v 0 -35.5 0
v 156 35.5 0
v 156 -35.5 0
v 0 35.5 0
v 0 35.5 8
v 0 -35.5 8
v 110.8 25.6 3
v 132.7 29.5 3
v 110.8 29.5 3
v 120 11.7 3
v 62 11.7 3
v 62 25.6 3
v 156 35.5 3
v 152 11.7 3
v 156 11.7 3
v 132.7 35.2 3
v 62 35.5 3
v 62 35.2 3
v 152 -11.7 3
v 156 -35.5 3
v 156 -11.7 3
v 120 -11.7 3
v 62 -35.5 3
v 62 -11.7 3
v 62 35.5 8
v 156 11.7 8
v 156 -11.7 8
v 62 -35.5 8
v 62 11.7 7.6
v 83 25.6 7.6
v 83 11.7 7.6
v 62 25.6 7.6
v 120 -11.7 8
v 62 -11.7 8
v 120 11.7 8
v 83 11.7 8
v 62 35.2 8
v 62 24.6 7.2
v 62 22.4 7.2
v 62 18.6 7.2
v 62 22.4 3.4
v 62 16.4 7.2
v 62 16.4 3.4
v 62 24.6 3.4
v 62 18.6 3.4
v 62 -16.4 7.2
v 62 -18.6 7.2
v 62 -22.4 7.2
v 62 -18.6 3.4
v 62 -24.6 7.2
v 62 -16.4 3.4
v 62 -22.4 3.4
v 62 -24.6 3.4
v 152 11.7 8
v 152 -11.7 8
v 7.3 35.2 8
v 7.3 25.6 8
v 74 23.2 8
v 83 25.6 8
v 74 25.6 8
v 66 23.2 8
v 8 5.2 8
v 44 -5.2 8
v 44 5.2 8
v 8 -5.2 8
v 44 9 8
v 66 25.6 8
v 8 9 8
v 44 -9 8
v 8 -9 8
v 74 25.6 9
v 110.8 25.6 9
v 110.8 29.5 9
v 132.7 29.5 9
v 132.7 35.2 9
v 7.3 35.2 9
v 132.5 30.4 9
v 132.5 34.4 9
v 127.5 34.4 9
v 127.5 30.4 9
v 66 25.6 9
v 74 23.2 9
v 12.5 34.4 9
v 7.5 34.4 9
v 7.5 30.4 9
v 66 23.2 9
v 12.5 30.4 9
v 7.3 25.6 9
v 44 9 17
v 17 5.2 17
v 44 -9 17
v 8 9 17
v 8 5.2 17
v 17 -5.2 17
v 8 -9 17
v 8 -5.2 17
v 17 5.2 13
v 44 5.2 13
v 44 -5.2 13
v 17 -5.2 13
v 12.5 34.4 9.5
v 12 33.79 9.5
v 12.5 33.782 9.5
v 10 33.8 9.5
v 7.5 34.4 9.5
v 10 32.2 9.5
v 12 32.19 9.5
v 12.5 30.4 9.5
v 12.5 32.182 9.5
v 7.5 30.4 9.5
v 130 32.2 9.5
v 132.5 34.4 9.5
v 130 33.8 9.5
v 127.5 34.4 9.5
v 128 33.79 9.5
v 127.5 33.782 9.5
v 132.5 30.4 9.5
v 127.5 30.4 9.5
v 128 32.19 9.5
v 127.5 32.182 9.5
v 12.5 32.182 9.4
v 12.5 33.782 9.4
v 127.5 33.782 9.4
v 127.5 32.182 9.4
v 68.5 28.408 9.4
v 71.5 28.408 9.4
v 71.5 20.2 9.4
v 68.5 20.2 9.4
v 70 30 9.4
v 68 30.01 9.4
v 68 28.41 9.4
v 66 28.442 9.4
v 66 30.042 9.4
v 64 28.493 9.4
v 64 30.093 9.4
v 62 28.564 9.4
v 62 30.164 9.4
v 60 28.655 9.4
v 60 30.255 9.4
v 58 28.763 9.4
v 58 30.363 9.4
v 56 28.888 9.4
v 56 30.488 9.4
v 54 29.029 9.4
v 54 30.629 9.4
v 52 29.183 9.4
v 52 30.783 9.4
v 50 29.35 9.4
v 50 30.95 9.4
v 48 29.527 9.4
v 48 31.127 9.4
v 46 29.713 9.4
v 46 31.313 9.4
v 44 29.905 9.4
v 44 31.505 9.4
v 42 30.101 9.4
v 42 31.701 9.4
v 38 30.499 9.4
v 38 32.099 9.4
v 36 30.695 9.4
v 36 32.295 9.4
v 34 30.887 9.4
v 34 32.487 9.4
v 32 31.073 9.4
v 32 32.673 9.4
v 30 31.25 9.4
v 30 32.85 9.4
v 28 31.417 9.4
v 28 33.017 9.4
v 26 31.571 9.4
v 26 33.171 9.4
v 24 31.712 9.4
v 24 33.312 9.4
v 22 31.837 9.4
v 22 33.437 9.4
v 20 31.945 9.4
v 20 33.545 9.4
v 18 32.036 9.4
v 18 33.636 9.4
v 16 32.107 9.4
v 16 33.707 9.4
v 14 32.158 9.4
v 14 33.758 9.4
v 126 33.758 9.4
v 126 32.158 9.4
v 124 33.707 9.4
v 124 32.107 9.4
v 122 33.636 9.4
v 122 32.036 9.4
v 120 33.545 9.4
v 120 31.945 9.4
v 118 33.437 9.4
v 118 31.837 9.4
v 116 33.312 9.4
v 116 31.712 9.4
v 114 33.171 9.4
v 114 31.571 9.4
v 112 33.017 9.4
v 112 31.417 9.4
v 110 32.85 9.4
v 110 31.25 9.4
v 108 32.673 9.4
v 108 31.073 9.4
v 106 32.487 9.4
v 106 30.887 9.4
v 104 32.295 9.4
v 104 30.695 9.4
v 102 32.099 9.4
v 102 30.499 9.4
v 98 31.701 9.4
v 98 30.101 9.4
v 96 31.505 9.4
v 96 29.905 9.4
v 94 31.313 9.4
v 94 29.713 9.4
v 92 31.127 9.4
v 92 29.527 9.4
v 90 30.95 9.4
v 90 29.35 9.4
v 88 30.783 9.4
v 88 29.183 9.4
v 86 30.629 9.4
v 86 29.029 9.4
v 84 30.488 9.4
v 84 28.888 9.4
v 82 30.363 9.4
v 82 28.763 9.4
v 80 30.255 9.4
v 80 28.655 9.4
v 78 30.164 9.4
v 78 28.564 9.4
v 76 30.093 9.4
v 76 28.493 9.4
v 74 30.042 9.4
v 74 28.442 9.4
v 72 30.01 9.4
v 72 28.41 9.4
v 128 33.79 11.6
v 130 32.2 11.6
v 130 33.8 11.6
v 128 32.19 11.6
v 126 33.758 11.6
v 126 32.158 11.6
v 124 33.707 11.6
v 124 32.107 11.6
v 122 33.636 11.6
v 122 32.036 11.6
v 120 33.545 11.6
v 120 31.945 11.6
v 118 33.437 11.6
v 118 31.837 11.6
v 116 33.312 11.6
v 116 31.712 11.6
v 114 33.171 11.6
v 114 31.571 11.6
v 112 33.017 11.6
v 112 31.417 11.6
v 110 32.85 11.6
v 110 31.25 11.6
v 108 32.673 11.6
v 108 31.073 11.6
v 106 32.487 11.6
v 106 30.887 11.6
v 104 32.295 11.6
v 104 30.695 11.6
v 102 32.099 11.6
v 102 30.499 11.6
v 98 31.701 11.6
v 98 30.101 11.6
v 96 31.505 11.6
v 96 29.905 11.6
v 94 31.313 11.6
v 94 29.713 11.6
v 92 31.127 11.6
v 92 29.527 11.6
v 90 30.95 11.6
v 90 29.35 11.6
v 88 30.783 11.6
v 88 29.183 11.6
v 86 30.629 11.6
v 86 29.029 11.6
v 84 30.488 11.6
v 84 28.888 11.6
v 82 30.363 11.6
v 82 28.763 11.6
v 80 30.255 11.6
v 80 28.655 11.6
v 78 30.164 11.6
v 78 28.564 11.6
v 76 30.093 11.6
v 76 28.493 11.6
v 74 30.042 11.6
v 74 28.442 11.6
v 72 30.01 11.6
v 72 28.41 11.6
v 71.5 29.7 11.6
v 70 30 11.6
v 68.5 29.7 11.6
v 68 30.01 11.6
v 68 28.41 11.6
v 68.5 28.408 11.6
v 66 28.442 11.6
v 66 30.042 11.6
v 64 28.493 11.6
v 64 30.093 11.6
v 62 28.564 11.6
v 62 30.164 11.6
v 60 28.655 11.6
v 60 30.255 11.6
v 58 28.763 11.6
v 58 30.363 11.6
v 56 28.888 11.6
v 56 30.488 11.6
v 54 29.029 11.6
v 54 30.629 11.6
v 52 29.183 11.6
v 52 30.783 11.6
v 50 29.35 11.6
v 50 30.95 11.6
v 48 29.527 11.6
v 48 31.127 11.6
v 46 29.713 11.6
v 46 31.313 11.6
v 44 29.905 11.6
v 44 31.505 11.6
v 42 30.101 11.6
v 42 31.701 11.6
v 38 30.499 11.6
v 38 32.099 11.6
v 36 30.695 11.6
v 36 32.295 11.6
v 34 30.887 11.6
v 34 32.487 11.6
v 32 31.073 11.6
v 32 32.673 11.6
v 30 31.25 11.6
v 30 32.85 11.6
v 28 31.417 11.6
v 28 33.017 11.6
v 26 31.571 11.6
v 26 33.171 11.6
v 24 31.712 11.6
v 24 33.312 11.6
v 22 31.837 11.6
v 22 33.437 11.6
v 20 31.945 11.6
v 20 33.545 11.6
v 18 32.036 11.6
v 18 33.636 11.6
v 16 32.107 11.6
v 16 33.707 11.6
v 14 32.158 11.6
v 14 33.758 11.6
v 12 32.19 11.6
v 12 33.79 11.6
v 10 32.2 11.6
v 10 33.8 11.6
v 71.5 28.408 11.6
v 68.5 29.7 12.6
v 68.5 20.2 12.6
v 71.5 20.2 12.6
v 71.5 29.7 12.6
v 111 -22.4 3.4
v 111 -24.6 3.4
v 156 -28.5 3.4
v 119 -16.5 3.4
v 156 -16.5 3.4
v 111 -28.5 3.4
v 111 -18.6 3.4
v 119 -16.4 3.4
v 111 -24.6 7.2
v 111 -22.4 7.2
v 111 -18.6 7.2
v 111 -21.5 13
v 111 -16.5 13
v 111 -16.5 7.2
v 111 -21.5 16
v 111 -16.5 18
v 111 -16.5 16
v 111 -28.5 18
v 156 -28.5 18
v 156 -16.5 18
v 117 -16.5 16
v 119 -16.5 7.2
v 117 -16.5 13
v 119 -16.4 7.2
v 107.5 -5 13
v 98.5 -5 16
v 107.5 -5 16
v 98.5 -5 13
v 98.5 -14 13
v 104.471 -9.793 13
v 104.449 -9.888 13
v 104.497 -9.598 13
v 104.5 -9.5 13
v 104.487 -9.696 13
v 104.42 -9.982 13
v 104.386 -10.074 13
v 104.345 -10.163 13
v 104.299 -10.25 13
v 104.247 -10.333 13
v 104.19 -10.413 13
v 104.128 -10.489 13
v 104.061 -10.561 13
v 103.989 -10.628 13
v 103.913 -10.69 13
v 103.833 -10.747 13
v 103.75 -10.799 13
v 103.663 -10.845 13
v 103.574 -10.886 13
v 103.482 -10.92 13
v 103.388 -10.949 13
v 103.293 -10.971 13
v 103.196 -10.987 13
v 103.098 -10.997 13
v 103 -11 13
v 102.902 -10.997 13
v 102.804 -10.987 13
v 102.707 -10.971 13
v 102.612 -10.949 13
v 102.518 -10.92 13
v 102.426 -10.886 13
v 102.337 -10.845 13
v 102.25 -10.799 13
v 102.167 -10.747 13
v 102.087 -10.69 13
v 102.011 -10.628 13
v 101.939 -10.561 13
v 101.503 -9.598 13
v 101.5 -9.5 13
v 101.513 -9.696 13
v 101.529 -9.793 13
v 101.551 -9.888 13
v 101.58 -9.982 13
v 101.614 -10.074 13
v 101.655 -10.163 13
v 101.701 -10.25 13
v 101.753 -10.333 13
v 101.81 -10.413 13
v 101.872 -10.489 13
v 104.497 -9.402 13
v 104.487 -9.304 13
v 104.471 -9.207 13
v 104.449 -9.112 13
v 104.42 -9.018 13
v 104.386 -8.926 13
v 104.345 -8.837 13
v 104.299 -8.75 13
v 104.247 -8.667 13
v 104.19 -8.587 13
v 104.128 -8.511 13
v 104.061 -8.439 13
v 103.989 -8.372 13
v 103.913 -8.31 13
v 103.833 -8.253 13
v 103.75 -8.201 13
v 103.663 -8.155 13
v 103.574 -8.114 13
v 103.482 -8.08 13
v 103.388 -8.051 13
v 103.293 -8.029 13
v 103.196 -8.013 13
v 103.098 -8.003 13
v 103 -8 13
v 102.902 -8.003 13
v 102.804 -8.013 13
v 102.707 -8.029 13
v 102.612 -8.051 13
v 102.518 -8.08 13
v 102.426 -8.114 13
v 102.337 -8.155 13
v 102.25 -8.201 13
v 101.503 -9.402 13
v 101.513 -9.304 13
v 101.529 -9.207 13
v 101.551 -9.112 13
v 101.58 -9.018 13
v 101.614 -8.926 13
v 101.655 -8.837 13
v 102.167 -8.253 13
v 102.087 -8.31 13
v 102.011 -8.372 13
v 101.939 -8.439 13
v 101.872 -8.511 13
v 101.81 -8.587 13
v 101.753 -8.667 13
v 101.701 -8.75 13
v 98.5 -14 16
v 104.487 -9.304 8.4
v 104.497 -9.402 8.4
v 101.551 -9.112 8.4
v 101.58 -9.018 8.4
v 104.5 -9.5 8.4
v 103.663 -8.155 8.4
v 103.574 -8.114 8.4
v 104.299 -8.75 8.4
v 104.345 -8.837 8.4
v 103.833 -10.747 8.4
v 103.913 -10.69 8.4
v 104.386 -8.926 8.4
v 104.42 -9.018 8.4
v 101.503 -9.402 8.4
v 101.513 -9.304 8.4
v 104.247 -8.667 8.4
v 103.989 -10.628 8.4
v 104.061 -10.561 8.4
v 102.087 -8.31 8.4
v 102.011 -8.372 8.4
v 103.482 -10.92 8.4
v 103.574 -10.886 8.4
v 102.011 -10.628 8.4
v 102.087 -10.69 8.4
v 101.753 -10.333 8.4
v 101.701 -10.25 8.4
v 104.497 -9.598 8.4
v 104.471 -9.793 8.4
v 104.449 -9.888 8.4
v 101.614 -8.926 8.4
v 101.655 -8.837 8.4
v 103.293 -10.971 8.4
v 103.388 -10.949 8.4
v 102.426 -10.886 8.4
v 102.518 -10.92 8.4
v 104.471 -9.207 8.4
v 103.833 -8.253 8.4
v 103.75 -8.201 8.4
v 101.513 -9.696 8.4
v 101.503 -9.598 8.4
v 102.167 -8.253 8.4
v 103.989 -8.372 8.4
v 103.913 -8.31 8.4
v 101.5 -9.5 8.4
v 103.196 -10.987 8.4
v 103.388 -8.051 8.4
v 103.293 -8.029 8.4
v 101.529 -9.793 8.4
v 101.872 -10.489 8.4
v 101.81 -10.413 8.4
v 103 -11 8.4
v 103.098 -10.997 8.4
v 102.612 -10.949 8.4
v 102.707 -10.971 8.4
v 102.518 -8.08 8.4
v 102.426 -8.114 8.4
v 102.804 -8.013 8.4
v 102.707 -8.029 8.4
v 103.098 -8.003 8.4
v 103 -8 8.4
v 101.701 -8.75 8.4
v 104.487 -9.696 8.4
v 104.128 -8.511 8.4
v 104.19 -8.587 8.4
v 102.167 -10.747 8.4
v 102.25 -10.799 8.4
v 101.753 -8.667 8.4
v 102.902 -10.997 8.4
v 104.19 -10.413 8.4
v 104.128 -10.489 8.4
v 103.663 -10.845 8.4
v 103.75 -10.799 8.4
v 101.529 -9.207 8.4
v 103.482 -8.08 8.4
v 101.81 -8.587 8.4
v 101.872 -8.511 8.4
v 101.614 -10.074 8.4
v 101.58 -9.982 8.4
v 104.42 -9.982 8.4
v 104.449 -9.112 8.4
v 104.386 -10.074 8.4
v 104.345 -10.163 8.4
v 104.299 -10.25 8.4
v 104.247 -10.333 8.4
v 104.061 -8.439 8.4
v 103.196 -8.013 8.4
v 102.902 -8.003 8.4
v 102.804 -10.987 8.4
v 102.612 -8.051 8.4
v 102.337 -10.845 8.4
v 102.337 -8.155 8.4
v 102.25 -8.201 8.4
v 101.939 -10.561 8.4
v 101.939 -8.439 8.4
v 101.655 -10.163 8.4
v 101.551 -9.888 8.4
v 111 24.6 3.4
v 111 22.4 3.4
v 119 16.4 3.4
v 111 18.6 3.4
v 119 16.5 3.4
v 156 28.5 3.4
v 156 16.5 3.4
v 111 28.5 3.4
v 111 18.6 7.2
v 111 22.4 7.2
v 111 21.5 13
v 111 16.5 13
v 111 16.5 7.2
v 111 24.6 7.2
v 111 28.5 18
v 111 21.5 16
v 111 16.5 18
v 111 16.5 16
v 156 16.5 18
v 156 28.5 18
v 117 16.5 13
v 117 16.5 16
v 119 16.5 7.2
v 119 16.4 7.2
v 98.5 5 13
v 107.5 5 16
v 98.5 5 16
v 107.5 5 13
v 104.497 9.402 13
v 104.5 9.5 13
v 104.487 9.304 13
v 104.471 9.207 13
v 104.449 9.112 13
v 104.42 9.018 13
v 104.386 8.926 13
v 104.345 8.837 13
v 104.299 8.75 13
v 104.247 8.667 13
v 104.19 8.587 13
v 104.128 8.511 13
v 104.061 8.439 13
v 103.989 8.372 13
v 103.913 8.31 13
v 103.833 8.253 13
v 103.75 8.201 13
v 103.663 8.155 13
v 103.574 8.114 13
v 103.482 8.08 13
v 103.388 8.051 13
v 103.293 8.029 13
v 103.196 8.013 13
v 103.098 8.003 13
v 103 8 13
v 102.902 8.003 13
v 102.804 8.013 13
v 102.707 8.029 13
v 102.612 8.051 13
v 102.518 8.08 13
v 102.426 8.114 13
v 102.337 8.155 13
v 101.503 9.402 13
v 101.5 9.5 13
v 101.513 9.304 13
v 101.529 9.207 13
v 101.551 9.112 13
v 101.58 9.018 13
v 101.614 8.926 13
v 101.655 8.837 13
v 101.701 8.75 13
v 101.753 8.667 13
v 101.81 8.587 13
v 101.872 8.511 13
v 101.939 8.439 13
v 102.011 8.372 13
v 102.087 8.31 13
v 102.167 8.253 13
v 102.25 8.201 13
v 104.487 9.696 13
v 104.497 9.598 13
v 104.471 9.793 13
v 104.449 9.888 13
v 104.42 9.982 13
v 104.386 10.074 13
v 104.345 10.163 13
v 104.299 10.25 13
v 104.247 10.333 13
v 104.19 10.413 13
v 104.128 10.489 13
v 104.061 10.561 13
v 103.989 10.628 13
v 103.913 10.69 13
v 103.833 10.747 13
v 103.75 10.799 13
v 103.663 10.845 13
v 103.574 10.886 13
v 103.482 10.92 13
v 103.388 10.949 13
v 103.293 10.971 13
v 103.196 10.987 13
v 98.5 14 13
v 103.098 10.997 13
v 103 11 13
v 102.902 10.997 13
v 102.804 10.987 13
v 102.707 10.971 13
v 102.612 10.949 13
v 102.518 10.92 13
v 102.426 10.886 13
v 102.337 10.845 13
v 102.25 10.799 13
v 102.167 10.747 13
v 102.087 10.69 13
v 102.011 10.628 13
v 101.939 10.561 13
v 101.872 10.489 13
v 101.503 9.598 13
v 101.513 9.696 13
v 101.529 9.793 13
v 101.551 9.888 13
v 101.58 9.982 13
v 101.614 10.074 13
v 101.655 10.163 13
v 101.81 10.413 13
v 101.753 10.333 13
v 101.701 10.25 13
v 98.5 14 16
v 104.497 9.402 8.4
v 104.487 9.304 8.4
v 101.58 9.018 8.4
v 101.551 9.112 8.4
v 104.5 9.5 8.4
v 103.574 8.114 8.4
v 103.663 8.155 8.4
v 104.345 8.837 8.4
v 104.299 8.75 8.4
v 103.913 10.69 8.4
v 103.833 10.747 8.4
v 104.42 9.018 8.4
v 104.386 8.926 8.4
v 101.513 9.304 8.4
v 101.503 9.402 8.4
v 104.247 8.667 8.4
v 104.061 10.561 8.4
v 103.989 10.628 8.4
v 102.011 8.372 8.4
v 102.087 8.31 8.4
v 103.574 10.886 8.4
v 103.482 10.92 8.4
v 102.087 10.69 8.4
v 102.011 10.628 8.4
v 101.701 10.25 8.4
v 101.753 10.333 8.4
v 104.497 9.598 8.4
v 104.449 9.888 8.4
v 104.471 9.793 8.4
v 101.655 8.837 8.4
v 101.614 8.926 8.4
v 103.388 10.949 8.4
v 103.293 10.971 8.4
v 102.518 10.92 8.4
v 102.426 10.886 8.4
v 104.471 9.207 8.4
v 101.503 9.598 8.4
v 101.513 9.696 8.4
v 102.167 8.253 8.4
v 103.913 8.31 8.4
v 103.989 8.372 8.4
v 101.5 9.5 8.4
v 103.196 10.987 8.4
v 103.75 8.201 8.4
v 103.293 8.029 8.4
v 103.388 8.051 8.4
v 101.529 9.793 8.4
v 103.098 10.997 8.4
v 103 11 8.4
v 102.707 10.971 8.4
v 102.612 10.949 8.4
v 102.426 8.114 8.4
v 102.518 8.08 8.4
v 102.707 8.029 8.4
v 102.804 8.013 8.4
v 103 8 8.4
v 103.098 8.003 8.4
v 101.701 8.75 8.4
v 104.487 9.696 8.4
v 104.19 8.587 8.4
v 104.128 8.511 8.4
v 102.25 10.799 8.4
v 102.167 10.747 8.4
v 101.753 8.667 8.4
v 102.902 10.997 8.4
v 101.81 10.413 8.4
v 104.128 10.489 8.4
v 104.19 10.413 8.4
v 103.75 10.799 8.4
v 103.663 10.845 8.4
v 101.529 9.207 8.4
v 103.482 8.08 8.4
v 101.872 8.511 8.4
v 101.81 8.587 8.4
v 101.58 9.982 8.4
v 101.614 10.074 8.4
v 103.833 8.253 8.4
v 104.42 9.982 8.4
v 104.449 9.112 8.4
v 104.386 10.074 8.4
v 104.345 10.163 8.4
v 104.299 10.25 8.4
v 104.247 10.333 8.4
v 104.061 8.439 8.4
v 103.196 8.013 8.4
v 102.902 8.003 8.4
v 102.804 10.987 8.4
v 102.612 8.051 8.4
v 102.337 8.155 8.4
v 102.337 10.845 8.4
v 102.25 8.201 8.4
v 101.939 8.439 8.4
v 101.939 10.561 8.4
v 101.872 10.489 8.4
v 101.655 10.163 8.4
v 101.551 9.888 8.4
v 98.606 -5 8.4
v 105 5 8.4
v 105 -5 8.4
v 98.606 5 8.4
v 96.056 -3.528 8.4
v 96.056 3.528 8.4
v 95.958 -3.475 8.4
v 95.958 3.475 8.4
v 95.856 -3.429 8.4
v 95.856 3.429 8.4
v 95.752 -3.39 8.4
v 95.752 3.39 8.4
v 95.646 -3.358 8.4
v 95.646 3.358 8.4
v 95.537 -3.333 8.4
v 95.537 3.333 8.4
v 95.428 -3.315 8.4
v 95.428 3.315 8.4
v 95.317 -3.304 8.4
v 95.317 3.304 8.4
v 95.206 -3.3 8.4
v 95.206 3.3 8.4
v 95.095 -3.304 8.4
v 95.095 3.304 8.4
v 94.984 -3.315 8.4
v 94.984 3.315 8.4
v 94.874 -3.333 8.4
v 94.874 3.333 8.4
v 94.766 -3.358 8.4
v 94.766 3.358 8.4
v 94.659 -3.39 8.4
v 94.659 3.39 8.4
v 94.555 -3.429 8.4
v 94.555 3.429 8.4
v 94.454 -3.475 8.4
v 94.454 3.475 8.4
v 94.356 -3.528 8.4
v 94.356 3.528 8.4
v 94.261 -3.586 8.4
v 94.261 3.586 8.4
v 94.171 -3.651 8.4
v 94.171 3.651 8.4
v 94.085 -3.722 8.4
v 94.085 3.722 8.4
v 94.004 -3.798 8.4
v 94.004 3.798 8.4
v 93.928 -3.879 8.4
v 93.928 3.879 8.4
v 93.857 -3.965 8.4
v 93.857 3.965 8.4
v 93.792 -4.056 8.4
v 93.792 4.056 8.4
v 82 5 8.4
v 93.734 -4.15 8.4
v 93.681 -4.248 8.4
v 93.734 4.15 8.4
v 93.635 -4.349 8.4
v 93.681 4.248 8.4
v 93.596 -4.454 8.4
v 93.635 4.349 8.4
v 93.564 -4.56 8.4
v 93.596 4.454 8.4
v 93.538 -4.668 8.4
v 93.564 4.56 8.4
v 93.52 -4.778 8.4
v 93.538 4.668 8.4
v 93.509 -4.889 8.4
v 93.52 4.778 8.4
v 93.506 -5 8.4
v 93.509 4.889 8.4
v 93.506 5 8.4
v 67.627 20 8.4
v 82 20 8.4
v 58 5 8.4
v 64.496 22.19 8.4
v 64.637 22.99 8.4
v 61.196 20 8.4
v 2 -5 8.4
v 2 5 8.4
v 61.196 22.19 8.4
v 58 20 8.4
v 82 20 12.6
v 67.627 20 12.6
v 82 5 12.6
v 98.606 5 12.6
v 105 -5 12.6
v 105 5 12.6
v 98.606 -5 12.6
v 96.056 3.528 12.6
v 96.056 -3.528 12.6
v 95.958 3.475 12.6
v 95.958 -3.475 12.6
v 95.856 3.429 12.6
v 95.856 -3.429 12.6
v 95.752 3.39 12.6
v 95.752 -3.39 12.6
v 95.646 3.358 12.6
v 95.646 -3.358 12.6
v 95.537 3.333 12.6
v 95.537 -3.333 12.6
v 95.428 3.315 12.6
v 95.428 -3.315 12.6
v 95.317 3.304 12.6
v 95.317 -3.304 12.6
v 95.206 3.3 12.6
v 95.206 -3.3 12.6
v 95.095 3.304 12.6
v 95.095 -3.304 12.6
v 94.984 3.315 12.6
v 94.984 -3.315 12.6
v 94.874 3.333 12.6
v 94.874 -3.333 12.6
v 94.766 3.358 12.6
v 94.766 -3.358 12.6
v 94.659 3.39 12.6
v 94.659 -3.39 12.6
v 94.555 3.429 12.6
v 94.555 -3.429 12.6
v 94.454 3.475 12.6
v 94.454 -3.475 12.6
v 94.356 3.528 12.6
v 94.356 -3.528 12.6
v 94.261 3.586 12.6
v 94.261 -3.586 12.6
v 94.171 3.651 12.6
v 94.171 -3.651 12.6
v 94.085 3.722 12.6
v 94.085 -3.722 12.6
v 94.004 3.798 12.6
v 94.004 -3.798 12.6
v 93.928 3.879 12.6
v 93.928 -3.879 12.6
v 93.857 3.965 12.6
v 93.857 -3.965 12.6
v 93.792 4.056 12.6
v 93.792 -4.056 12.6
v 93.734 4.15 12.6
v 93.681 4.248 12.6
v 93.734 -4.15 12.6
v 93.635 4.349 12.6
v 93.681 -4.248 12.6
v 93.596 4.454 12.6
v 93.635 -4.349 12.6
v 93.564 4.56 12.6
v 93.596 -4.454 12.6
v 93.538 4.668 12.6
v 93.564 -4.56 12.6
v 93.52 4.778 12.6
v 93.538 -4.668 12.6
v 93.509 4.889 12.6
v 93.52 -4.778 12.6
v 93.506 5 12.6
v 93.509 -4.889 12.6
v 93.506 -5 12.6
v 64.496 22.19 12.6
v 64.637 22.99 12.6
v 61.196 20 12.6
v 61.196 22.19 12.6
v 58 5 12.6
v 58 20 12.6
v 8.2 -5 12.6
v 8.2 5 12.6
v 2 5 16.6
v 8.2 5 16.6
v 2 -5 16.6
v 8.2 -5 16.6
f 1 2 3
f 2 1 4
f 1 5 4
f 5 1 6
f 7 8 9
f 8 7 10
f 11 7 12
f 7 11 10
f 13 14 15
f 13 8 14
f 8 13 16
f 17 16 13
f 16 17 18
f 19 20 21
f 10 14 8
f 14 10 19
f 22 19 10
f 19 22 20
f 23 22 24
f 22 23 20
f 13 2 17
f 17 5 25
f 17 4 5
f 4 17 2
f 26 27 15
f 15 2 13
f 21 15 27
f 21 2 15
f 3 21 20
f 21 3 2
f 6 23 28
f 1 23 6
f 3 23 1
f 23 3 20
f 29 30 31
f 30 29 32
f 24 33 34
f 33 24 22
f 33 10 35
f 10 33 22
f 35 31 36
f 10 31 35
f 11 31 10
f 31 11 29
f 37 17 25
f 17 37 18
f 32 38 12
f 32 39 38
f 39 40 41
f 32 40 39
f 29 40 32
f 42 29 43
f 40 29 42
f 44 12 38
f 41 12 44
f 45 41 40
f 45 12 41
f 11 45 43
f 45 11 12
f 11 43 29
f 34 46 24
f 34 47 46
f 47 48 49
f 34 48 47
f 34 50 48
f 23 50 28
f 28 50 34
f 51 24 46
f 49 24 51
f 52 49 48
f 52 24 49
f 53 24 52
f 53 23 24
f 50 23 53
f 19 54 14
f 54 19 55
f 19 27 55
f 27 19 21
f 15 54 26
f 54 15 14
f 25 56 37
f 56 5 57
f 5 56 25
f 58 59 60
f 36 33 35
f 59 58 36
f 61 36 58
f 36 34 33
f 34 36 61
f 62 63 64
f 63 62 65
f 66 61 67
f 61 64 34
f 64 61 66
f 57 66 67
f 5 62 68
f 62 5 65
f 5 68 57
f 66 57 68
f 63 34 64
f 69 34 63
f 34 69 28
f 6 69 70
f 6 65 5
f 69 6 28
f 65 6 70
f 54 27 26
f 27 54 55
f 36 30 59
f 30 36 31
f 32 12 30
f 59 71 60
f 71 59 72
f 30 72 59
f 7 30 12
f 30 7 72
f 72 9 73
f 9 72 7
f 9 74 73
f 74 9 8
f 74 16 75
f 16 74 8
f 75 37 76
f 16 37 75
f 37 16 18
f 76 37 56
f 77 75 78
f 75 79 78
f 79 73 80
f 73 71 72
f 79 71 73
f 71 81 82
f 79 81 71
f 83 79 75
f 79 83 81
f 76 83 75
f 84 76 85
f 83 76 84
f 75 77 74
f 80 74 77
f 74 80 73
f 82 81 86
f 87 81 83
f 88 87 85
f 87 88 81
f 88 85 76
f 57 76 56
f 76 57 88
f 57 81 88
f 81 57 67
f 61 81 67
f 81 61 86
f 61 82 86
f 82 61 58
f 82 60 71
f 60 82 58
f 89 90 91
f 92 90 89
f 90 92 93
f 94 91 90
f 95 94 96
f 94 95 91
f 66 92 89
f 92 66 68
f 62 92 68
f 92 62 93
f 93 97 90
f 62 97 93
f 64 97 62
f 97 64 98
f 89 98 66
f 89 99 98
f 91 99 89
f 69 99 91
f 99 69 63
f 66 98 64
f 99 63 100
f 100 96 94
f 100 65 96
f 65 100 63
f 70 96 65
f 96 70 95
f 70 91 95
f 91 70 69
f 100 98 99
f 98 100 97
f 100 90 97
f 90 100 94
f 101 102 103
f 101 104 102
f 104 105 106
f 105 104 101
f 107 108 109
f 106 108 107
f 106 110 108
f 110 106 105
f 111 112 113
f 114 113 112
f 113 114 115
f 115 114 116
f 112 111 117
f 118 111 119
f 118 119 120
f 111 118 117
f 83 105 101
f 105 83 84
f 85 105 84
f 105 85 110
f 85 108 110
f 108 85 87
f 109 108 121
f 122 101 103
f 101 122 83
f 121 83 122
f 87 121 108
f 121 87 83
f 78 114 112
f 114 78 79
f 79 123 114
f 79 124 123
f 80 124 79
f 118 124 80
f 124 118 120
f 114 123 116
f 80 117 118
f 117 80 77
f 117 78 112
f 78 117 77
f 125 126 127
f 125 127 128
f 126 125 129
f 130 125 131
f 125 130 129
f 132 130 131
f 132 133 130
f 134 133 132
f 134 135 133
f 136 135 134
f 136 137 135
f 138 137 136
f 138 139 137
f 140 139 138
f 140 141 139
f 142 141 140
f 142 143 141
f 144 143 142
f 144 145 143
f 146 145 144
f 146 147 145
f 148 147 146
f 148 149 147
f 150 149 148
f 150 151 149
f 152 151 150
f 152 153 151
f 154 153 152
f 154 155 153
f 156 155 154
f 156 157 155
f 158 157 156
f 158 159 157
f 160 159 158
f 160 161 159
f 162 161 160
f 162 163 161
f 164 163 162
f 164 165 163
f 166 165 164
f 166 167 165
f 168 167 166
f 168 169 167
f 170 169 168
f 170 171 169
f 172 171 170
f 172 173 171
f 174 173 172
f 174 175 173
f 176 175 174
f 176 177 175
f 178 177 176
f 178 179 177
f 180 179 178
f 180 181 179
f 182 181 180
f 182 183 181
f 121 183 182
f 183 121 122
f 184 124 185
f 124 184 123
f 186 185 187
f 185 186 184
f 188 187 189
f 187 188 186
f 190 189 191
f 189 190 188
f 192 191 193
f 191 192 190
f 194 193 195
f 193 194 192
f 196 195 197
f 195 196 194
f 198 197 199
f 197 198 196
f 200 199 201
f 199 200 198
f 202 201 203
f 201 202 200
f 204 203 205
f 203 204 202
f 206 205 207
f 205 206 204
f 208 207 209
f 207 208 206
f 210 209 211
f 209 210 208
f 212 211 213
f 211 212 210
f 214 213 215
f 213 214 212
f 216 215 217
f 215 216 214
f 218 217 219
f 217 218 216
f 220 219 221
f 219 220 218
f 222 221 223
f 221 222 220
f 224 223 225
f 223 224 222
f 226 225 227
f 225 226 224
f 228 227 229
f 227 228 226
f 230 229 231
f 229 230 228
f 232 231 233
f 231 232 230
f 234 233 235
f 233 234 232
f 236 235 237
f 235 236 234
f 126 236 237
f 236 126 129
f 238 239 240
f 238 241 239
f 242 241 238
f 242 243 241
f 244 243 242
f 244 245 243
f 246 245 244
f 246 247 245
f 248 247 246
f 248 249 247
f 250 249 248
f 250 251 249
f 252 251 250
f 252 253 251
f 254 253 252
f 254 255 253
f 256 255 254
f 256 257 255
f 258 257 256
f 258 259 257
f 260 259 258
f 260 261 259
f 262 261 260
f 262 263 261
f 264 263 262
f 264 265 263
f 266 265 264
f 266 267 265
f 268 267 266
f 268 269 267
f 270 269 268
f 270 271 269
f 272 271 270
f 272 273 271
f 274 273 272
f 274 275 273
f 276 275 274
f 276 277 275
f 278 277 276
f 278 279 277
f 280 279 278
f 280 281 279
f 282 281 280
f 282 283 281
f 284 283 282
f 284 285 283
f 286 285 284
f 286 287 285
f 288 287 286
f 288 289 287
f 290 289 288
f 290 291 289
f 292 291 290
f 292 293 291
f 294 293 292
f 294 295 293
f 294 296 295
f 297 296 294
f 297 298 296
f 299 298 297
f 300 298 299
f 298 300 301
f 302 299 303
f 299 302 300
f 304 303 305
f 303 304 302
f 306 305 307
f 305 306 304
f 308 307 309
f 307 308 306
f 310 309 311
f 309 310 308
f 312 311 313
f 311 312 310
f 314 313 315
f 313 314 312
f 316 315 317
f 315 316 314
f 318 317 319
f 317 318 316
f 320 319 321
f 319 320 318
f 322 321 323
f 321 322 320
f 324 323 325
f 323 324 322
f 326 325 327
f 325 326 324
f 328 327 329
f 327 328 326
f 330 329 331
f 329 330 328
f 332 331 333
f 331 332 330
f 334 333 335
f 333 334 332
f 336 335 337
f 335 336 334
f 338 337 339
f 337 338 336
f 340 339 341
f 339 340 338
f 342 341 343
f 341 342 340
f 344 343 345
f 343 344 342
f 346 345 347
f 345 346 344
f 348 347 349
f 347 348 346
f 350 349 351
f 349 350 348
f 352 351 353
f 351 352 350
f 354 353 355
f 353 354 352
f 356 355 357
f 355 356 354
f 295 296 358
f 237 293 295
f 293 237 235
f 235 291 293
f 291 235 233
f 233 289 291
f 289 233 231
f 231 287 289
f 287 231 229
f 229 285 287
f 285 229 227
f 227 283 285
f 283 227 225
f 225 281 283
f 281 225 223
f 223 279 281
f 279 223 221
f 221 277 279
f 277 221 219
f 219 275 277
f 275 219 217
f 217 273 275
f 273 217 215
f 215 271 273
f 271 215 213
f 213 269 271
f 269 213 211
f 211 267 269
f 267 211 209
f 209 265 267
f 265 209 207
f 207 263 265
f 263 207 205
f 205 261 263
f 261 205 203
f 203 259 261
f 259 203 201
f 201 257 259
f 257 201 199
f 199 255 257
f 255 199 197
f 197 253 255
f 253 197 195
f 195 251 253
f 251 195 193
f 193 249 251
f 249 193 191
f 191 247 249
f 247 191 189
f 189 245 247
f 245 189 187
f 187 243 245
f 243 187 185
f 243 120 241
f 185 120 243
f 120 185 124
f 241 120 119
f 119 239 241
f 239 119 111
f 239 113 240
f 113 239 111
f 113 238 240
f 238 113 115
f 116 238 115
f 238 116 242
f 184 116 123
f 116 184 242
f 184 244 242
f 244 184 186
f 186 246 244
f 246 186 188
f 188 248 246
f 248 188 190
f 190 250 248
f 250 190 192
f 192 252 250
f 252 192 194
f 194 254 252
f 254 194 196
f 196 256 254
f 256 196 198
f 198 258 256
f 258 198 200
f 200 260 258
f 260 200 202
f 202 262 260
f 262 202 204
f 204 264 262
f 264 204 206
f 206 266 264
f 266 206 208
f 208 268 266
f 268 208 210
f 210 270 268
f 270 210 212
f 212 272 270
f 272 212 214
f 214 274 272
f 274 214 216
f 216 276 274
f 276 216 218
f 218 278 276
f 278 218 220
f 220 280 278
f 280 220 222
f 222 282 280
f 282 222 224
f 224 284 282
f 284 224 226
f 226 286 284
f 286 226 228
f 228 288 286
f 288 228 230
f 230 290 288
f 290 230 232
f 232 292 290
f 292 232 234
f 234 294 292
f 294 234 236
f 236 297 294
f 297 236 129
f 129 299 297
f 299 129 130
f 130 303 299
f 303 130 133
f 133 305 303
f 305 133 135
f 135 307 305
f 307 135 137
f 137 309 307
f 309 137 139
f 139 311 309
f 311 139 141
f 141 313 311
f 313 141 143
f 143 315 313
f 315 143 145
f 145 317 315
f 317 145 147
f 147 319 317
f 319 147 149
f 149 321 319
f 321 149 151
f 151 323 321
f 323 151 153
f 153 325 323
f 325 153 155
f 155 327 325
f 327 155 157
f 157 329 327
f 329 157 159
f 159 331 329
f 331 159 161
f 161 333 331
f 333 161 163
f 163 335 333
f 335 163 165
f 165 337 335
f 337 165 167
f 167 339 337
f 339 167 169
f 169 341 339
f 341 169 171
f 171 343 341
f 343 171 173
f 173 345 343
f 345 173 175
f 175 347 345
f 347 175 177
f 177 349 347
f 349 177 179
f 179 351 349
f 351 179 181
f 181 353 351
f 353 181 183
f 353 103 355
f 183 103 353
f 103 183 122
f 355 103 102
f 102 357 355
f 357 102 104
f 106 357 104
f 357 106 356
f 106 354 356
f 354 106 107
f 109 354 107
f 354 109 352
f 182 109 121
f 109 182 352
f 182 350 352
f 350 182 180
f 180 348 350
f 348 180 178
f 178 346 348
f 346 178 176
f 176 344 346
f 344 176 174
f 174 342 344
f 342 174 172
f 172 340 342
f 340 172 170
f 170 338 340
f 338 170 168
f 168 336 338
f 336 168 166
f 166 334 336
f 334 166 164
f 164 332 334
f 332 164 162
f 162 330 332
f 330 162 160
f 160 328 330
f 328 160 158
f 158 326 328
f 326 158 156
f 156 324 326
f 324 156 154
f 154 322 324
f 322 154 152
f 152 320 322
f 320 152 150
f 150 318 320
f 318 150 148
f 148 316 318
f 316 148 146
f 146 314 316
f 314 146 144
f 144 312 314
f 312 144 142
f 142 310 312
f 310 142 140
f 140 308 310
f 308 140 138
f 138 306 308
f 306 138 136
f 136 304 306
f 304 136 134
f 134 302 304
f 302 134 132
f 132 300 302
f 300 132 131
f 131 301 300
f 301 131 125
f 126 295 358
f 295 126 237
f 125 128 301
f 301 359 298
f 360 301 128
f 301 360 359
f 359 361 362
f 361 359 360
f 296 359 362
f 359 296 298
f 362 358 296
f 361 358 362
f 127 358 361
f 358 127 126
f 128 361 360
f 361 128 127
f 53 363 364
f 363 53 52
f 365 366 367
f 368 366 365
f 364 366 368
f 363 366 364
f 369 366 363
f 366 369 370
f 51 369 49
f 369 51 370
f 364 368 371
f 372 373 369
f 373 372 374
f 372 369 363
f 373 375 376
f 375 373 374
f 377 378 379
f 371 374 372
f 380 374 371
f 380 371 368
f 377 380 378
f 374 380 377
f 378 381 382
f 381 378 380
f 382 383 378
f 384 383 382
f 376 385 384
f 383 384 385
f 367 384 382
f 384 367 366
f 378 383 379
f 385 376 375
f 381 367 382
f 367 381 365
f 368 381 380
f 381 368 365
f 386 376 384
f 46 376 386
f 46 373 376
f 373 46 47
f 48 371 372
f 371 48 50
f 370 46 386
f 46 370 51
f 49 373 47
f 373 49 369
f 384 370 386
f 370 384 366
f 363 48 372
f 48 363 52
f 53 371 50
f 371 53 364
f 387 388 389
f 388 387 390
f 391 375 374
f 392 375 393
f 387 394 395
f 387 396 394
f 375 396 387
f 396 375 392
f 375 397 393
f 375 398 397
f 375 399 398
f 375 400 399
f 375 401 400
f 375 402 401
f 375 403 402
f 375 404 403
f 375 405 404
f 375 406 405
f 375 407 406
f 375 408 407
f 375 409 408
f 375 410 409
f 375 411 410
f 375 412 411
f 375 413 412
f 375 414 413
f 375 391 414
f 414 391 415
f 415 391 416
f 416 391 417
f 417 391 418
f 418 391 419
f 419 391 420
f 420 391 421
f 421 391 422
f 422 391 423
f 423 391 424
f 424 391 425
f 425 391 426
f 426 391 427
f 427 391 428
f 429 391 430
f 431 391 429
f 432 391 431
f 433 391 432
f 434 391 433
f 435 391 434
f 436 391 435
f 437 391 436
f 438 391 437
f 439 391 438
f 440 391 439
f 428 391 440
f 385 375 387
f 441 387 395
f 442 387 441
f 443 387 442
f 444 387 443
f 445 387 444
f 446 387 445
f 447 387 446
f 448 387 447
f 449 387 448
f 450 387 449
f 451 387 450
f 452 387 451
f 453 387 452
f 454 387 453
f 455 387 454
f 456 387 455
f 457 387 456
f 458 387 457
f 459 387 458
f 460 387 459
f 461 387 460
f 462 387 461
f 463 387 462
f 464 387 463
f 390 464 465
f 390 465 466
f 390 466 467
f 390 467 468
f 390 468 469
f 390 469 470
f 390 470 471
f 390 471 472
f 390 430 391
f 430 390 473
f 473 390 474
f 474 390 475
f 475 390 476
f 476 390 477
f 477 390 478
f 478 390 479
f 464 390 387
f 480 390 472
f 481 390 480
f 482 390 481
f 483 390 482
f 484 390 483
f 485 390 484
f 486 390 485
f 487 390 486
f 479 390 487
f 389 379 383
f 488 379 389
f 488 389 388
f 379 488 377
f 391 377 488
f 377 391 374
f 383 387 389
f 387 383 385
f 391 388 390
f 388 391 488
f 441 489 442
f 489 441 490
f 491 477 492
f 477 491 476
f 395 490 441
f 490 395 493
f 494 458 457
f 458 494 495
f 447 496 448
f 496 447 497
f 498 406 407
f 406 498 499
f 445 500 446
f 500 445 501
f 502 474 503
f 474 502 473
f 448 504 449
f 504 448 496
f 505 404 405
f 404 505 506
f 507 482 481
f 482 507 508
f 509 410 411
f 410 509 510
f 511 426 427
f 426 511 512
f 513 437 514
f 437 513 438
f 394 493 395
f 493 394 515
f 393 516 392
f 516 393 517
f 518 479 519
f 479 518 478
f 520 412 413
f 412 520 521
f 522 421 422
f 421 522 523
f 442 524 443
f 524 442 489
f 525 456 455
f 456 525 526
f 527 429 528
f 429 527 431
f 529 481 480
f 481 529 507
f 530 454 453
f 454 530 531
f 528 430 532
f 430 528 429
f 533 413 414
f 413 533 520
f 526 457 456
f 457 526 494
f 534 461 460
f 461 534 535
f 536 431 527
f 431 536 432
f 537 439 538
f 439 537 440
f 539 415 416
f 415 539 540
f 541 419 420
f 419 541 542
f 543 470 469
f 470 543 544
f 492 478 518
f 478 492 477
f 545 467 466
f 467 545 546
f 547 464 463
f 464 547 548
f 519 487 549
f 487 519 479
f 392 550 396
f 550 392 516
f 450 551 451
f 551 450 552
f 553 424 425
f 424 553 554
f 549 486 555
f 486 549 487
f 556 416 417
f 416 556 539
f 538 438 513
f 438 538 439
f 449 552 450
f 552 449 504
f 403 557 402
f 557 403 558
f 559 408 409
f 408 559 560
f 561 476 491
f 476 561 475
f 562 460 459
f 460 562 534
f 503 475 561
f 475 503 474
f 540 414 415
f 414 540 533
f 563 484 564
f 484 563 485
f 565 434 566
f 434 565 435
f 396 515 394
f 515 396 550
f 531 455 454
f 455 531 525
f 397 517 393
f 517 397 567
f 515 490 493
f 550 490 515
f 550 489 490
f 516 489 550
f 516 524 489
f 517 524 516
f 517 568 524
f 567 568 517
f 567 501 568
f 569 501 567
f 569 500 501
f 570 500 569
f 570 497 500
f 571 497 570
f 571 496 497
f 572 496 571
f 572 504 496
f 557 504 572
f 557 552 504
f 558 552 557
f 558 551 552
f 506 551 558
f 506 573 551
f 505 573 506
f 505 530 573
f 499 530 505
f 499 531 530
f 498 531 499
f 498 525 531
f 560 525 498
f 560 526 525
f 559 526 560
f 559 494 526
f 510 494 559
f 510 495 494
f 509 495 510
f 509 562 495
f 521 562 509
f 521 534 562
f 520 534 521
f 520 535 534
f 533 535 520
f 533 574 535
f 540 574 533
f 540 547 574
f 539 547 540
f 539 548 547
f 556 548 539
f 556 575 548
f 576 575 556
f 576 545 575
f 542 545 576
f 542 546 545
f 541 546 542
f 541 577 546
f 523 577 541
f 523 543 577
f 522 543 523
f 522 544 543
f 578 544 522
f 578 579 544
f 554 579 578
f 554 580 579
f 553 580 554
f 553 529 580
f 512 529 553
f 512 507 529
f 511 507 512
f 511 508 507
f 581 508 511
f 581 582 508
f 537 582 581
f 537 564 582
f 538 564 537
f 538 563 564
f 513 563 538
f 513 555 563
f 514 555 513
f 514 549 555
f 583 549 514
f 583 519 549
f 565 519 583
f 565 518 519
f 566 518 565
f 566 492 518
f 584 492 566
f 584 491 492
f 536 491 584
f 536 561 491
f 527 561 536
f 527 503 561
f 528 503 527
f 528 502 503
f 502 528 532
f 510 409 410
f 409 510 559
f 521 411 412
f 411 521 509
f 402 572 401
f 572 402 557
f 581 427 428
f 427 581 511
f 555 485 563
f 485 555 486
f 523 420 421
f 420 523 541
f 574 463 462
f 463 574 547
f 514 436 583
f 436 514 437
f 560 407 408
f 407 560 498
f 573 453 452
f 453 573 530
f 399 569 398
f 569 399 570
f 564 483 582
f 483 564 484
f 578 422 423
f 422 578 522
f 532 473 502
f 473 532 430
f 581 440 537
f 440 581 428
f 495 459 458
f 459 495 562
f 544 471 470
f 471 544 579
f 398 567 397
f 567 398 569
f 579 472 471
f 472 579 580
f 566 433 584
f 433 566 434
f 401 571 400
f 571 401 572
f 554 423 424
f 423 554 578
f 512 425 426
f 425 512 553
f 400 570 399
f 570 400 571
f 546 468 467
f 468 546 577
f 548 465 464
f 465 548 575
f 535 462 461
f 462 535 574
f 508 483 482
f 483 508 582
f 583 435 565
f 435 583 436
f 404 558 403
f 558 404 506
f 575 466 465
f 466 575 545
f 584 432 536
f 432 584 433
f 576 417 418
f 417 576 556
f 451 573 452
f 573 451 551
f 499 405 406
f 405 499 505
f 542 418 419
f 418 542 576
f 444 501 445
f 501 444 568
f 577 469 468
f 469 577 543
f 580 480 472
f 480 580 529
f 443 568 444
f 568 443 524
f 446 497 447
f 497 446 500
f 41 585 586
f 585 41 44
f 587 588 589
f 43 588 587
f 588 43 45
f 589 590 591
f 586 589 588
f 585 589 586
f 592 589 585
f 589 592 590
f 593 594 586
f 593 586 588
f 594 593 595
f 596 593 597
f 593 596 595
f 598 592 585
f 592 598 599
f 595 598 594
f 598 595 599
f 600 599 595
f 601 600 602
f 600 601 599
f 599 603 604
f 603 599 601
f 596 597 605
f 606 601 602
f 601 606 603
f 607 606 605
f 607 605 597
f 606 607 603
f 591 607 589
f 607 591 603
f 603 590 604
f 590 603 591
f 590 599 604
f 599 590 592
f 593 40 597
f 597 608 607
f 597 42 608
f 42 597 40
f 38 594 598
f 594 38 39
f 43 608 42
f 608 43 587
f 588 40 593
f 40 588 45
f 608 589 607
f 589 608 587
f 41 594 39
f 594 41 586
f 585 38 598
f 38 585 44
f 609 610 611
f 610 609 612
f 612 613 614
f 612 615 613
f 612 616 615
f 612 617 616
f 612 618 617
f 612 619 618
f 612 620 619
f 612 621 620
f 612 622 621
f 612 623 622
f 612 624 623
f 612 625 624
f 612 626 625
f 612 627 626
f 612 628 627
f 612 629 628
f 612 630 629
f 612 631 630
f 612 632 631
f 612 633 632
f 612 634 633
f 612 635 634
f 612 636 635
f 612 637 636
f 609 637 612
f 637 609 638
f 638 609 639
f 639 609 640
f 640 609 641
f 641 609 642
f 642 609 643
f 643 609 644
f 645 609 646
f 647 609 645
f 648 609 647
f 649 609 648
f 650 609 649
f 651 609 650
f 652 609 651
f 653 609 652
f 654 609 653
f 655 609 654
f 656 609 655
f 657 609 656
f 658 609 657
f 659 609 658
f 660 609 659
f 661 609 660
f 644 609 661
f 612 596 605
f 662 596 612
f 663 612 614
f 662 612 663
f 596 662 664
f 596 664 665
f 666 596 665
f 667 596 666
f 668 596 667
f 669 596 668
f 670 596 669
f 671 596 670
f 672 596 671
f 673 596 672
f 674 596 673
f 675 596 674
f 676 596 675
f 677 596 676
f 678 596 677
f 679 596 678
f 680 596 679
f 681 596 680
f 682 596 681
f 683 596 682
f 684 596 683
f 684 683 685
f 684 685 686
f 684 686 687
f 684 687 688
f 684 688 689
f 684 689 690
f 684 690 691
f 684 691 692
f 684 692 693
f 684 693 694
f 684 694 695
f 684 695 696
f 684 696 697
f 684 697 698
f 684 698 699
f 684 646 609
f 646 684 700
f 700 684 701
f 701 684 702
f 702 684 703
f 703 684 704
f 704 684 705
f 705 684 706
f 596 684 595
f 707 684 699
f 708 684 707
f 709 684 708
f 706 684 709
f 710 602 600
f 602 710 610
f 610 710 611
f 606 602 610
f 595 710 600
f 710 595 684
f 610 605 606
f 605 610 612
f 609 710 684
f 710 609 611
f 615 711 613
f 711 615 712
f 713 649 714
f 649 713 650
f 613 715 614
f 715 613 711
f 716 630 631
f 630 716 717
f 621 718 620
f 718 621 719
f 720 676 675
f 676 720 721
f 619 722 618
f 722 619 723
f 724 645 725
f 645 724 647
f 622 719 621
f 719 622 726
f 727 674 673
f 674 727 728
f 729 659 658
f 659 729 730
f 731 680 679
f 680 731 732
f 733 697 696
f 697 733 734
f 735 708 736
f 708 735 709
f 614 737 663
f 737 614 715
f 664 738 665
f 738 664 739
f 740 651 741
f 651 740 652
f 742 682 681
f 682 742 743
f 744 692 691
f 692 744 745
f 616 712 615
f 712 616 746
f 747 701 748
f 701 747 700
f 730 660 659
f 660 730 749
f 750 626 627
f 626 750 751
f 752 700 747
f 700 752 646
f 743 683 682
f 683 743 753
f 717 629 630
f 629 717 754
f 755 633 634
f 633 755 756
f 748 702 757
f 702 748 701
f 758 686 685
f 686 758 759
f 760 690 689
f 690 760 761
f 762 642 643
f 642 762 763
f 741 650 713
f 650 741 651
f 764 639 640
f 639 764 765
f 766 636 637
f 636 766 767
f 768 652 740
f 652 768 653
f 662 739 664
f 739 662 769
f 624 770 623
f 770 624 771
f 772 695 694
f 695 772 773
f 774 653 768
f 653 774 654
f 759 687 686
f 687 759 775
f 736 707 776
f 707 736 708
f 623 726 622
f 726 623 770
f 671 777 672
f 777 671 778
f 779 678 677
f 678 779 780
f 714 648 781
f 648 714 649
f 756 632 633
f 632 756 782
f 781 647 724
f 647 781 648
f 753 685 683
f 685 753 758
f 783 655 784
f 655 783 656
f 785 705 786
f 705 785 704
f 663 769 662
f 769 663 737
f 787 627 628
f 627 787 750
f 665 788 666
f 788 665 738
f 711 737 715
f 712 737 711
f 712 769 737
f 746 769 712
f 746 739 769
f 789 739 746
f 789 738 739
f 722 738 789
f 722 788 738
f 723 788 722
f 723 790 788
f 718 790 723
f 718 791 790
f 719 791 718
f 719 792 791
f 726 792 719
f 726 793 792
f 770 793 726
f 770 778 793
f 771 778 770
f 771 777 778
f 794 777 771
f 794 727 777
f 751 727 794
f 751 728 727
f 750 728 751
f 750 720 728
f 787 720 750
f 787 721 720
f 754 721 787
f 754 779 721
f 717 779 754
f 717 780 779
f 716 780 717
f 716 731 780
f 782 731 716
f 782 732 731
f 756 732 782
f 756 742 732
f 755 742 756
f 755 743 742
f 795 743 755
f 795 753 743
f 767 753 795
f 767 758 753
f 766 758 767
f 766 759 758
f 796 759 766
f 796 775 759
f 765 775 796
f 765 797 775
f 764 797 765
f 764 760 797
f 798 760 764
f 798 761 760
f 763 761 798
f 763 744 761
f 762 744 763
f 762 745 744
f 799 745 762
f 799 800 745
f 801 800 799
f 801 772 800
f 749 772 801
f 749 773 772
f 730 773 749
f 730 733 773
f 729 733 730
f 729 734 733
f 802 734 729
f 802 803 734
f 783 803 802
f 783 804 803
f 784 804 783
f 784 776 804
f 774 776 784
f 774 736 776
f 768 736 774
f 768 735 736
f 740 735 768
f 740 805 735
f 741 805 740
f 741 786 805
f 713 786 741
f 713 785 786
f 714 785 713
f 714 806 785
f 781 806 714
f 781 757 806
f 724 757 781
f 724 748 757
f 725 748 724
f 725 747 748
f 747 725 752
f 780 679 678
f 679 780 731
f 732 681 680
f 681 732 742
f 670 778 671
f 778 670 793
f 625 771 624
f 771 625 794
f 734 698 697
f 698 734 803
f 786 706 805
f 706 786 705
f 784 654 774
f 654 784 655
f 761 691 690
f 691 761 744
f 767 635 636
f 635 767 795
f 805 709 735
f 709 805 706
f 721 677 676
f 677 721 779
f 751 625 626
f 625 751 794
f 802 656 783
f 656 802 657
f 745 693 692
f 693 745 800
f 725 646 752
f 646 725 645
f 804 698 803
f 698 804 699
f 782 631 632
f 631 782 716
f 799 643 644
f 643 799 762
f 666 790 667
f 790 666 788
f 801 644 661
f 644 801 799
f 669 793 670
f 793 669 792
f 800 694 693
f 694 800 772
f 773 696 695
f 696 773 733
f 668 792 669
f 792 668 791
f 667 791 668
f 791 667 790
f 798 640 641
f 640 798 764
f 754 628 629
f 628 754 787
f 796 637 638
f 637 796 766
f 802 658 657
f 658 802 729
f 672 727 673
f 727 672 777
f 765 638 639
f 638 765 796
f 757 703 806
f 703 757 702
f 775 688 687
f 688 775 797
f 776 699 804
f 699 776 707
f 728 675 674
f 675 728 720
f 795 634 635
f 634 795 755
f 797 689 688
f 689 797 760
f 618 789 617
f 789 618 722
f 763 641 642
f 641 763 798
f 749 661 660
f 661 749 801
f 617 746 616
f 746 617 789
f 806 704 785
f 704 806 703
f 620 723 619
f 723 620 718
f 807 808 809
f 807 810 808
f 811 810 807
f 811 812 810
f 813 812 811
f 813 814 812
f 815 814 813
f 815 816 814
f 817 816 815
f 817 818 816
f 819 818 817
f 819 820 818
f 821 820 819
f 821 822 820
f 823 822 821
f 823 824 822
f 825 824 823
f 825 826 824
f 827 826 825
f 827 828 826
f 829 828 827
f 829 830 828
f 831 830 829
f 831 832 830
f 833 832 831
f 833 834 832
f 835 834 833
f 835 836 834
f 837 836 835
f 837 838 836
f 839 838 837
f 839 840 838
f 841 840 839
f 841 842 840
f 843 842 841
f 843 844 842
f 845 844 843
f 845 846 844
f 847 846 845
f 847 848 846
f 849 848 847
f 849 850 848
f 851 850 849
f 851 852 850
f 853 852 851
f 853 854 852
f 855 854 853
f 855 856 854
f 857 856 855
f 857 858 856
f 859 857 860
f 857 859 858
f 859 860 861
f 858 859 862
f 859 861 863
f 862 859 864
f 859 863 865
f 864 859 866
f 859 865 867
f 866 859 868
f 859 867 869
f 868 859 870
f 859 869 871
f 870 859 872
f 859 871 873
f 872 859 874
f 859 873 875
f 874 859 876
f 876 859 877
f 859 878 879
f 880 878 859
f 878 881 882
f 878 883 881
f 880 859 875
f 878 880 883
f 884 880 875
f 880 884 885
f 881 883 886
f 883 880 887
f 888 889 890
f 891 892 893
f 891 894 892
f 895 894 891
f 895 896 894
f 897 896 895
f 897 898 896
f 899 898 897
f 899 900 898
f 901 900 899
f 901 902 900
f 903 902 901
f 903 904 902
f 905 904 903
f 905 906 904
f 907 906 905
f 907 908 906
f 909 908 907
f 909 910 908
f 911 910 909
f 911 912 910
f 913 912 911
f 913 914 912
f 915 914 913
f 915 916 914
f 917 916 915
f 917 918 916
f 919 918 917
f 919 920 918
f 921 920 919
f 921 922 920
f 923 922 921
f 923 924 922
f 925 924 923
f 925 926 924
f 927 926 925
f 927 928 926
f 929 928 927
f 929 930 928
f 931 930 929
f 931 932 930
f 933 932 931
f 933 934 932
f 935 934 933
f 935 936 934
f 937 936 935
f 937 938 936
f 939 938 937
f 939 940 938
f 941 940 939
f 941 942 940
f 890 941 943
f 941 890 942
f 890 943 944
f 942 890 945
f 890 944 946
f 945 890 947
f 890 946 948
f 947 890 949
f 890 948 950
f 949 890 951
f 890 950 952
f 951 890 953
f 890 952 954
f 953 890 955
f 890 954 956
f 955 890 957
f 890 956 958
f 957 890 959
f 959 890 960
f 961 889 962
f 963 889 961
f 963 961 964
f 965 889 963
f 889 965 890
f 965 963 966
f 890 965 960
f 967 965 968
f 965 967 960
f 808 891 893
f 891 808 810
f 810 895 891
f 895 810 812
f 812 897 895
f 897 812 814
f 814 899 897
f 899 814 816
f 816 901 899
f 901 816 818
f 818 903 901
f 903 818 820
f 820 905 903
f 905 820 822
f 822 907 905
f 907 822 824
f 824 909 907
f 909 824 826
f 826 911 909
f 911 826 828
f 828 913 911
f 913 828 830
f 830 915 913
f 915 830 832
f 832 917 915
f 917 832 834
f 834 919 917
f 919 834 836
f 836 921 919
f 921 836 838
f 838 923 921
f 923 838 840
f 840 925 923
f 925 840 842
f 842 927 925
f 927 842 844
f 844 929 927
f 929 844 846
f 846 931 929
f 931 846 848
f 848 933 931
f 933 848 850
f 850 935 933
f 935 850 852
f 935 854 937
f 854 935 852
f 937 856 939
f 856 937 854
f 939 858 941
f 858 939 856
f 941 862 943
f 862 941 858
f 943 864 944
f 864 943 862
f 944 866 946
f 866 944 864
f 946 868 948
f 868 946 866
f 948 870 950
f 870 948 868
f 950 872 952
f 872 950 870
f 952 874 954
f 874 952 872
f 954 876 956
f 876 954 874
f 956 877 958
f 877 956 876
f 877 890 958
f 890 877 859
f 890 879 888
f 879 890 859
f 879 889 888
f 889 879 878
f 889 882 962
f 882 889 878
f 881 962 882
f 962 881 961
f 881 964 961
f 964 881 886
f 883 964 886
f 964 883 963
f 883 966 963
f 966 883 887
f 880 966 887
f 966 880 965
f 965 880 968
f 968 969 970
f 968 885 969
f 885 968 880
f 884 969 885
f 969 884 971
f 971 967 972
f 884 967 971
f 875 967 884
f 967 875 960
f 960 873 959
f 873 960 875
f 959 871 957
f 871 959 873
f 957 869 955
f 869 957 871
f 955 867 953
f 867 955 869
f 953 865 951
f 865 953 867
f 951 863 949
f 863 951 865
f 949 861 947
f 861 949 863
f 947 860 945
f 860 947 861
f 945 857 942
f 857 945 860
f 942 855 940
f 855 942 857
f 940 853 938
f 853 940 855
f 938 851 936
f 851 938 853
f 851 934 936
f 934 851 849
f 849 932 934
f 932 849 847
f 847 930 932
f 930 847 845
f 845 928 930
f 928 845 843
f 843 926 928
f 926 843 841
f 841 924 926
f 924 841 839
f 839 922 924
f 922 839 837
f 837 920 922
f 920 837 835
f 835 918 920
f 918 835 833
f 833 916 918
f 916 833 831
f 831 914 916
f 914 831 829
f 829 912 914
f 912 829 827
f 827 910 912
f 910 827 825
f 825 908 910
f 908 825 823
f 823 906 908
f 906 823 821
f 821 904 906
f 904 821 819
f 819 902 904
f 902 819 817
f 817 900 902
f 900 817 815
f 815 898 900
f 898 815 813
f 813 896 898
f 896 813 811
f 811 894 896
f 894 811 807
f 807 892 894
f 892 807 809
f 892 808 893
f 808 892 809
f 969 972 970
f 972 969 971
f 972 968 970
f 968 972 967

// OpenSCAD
// Print this first. A short version of the production collet grabber — nothing
// copied, just the entry design with shorter fingers — to tune the collar
// clearance `xy_tol` for your printer fast. Print it, slide the collar; if it's
// fused, raise `xy_tol` by 0.05 and reprint; if it's sloppy, lower it. See
// NOTES.md "Print this first". Overrides sit below the include (OpenSCAD
// resolves top-level variables last-assignment-wins).
include <compliant-gripper.scad>
finger_h = 15;
collar_h = 6;
